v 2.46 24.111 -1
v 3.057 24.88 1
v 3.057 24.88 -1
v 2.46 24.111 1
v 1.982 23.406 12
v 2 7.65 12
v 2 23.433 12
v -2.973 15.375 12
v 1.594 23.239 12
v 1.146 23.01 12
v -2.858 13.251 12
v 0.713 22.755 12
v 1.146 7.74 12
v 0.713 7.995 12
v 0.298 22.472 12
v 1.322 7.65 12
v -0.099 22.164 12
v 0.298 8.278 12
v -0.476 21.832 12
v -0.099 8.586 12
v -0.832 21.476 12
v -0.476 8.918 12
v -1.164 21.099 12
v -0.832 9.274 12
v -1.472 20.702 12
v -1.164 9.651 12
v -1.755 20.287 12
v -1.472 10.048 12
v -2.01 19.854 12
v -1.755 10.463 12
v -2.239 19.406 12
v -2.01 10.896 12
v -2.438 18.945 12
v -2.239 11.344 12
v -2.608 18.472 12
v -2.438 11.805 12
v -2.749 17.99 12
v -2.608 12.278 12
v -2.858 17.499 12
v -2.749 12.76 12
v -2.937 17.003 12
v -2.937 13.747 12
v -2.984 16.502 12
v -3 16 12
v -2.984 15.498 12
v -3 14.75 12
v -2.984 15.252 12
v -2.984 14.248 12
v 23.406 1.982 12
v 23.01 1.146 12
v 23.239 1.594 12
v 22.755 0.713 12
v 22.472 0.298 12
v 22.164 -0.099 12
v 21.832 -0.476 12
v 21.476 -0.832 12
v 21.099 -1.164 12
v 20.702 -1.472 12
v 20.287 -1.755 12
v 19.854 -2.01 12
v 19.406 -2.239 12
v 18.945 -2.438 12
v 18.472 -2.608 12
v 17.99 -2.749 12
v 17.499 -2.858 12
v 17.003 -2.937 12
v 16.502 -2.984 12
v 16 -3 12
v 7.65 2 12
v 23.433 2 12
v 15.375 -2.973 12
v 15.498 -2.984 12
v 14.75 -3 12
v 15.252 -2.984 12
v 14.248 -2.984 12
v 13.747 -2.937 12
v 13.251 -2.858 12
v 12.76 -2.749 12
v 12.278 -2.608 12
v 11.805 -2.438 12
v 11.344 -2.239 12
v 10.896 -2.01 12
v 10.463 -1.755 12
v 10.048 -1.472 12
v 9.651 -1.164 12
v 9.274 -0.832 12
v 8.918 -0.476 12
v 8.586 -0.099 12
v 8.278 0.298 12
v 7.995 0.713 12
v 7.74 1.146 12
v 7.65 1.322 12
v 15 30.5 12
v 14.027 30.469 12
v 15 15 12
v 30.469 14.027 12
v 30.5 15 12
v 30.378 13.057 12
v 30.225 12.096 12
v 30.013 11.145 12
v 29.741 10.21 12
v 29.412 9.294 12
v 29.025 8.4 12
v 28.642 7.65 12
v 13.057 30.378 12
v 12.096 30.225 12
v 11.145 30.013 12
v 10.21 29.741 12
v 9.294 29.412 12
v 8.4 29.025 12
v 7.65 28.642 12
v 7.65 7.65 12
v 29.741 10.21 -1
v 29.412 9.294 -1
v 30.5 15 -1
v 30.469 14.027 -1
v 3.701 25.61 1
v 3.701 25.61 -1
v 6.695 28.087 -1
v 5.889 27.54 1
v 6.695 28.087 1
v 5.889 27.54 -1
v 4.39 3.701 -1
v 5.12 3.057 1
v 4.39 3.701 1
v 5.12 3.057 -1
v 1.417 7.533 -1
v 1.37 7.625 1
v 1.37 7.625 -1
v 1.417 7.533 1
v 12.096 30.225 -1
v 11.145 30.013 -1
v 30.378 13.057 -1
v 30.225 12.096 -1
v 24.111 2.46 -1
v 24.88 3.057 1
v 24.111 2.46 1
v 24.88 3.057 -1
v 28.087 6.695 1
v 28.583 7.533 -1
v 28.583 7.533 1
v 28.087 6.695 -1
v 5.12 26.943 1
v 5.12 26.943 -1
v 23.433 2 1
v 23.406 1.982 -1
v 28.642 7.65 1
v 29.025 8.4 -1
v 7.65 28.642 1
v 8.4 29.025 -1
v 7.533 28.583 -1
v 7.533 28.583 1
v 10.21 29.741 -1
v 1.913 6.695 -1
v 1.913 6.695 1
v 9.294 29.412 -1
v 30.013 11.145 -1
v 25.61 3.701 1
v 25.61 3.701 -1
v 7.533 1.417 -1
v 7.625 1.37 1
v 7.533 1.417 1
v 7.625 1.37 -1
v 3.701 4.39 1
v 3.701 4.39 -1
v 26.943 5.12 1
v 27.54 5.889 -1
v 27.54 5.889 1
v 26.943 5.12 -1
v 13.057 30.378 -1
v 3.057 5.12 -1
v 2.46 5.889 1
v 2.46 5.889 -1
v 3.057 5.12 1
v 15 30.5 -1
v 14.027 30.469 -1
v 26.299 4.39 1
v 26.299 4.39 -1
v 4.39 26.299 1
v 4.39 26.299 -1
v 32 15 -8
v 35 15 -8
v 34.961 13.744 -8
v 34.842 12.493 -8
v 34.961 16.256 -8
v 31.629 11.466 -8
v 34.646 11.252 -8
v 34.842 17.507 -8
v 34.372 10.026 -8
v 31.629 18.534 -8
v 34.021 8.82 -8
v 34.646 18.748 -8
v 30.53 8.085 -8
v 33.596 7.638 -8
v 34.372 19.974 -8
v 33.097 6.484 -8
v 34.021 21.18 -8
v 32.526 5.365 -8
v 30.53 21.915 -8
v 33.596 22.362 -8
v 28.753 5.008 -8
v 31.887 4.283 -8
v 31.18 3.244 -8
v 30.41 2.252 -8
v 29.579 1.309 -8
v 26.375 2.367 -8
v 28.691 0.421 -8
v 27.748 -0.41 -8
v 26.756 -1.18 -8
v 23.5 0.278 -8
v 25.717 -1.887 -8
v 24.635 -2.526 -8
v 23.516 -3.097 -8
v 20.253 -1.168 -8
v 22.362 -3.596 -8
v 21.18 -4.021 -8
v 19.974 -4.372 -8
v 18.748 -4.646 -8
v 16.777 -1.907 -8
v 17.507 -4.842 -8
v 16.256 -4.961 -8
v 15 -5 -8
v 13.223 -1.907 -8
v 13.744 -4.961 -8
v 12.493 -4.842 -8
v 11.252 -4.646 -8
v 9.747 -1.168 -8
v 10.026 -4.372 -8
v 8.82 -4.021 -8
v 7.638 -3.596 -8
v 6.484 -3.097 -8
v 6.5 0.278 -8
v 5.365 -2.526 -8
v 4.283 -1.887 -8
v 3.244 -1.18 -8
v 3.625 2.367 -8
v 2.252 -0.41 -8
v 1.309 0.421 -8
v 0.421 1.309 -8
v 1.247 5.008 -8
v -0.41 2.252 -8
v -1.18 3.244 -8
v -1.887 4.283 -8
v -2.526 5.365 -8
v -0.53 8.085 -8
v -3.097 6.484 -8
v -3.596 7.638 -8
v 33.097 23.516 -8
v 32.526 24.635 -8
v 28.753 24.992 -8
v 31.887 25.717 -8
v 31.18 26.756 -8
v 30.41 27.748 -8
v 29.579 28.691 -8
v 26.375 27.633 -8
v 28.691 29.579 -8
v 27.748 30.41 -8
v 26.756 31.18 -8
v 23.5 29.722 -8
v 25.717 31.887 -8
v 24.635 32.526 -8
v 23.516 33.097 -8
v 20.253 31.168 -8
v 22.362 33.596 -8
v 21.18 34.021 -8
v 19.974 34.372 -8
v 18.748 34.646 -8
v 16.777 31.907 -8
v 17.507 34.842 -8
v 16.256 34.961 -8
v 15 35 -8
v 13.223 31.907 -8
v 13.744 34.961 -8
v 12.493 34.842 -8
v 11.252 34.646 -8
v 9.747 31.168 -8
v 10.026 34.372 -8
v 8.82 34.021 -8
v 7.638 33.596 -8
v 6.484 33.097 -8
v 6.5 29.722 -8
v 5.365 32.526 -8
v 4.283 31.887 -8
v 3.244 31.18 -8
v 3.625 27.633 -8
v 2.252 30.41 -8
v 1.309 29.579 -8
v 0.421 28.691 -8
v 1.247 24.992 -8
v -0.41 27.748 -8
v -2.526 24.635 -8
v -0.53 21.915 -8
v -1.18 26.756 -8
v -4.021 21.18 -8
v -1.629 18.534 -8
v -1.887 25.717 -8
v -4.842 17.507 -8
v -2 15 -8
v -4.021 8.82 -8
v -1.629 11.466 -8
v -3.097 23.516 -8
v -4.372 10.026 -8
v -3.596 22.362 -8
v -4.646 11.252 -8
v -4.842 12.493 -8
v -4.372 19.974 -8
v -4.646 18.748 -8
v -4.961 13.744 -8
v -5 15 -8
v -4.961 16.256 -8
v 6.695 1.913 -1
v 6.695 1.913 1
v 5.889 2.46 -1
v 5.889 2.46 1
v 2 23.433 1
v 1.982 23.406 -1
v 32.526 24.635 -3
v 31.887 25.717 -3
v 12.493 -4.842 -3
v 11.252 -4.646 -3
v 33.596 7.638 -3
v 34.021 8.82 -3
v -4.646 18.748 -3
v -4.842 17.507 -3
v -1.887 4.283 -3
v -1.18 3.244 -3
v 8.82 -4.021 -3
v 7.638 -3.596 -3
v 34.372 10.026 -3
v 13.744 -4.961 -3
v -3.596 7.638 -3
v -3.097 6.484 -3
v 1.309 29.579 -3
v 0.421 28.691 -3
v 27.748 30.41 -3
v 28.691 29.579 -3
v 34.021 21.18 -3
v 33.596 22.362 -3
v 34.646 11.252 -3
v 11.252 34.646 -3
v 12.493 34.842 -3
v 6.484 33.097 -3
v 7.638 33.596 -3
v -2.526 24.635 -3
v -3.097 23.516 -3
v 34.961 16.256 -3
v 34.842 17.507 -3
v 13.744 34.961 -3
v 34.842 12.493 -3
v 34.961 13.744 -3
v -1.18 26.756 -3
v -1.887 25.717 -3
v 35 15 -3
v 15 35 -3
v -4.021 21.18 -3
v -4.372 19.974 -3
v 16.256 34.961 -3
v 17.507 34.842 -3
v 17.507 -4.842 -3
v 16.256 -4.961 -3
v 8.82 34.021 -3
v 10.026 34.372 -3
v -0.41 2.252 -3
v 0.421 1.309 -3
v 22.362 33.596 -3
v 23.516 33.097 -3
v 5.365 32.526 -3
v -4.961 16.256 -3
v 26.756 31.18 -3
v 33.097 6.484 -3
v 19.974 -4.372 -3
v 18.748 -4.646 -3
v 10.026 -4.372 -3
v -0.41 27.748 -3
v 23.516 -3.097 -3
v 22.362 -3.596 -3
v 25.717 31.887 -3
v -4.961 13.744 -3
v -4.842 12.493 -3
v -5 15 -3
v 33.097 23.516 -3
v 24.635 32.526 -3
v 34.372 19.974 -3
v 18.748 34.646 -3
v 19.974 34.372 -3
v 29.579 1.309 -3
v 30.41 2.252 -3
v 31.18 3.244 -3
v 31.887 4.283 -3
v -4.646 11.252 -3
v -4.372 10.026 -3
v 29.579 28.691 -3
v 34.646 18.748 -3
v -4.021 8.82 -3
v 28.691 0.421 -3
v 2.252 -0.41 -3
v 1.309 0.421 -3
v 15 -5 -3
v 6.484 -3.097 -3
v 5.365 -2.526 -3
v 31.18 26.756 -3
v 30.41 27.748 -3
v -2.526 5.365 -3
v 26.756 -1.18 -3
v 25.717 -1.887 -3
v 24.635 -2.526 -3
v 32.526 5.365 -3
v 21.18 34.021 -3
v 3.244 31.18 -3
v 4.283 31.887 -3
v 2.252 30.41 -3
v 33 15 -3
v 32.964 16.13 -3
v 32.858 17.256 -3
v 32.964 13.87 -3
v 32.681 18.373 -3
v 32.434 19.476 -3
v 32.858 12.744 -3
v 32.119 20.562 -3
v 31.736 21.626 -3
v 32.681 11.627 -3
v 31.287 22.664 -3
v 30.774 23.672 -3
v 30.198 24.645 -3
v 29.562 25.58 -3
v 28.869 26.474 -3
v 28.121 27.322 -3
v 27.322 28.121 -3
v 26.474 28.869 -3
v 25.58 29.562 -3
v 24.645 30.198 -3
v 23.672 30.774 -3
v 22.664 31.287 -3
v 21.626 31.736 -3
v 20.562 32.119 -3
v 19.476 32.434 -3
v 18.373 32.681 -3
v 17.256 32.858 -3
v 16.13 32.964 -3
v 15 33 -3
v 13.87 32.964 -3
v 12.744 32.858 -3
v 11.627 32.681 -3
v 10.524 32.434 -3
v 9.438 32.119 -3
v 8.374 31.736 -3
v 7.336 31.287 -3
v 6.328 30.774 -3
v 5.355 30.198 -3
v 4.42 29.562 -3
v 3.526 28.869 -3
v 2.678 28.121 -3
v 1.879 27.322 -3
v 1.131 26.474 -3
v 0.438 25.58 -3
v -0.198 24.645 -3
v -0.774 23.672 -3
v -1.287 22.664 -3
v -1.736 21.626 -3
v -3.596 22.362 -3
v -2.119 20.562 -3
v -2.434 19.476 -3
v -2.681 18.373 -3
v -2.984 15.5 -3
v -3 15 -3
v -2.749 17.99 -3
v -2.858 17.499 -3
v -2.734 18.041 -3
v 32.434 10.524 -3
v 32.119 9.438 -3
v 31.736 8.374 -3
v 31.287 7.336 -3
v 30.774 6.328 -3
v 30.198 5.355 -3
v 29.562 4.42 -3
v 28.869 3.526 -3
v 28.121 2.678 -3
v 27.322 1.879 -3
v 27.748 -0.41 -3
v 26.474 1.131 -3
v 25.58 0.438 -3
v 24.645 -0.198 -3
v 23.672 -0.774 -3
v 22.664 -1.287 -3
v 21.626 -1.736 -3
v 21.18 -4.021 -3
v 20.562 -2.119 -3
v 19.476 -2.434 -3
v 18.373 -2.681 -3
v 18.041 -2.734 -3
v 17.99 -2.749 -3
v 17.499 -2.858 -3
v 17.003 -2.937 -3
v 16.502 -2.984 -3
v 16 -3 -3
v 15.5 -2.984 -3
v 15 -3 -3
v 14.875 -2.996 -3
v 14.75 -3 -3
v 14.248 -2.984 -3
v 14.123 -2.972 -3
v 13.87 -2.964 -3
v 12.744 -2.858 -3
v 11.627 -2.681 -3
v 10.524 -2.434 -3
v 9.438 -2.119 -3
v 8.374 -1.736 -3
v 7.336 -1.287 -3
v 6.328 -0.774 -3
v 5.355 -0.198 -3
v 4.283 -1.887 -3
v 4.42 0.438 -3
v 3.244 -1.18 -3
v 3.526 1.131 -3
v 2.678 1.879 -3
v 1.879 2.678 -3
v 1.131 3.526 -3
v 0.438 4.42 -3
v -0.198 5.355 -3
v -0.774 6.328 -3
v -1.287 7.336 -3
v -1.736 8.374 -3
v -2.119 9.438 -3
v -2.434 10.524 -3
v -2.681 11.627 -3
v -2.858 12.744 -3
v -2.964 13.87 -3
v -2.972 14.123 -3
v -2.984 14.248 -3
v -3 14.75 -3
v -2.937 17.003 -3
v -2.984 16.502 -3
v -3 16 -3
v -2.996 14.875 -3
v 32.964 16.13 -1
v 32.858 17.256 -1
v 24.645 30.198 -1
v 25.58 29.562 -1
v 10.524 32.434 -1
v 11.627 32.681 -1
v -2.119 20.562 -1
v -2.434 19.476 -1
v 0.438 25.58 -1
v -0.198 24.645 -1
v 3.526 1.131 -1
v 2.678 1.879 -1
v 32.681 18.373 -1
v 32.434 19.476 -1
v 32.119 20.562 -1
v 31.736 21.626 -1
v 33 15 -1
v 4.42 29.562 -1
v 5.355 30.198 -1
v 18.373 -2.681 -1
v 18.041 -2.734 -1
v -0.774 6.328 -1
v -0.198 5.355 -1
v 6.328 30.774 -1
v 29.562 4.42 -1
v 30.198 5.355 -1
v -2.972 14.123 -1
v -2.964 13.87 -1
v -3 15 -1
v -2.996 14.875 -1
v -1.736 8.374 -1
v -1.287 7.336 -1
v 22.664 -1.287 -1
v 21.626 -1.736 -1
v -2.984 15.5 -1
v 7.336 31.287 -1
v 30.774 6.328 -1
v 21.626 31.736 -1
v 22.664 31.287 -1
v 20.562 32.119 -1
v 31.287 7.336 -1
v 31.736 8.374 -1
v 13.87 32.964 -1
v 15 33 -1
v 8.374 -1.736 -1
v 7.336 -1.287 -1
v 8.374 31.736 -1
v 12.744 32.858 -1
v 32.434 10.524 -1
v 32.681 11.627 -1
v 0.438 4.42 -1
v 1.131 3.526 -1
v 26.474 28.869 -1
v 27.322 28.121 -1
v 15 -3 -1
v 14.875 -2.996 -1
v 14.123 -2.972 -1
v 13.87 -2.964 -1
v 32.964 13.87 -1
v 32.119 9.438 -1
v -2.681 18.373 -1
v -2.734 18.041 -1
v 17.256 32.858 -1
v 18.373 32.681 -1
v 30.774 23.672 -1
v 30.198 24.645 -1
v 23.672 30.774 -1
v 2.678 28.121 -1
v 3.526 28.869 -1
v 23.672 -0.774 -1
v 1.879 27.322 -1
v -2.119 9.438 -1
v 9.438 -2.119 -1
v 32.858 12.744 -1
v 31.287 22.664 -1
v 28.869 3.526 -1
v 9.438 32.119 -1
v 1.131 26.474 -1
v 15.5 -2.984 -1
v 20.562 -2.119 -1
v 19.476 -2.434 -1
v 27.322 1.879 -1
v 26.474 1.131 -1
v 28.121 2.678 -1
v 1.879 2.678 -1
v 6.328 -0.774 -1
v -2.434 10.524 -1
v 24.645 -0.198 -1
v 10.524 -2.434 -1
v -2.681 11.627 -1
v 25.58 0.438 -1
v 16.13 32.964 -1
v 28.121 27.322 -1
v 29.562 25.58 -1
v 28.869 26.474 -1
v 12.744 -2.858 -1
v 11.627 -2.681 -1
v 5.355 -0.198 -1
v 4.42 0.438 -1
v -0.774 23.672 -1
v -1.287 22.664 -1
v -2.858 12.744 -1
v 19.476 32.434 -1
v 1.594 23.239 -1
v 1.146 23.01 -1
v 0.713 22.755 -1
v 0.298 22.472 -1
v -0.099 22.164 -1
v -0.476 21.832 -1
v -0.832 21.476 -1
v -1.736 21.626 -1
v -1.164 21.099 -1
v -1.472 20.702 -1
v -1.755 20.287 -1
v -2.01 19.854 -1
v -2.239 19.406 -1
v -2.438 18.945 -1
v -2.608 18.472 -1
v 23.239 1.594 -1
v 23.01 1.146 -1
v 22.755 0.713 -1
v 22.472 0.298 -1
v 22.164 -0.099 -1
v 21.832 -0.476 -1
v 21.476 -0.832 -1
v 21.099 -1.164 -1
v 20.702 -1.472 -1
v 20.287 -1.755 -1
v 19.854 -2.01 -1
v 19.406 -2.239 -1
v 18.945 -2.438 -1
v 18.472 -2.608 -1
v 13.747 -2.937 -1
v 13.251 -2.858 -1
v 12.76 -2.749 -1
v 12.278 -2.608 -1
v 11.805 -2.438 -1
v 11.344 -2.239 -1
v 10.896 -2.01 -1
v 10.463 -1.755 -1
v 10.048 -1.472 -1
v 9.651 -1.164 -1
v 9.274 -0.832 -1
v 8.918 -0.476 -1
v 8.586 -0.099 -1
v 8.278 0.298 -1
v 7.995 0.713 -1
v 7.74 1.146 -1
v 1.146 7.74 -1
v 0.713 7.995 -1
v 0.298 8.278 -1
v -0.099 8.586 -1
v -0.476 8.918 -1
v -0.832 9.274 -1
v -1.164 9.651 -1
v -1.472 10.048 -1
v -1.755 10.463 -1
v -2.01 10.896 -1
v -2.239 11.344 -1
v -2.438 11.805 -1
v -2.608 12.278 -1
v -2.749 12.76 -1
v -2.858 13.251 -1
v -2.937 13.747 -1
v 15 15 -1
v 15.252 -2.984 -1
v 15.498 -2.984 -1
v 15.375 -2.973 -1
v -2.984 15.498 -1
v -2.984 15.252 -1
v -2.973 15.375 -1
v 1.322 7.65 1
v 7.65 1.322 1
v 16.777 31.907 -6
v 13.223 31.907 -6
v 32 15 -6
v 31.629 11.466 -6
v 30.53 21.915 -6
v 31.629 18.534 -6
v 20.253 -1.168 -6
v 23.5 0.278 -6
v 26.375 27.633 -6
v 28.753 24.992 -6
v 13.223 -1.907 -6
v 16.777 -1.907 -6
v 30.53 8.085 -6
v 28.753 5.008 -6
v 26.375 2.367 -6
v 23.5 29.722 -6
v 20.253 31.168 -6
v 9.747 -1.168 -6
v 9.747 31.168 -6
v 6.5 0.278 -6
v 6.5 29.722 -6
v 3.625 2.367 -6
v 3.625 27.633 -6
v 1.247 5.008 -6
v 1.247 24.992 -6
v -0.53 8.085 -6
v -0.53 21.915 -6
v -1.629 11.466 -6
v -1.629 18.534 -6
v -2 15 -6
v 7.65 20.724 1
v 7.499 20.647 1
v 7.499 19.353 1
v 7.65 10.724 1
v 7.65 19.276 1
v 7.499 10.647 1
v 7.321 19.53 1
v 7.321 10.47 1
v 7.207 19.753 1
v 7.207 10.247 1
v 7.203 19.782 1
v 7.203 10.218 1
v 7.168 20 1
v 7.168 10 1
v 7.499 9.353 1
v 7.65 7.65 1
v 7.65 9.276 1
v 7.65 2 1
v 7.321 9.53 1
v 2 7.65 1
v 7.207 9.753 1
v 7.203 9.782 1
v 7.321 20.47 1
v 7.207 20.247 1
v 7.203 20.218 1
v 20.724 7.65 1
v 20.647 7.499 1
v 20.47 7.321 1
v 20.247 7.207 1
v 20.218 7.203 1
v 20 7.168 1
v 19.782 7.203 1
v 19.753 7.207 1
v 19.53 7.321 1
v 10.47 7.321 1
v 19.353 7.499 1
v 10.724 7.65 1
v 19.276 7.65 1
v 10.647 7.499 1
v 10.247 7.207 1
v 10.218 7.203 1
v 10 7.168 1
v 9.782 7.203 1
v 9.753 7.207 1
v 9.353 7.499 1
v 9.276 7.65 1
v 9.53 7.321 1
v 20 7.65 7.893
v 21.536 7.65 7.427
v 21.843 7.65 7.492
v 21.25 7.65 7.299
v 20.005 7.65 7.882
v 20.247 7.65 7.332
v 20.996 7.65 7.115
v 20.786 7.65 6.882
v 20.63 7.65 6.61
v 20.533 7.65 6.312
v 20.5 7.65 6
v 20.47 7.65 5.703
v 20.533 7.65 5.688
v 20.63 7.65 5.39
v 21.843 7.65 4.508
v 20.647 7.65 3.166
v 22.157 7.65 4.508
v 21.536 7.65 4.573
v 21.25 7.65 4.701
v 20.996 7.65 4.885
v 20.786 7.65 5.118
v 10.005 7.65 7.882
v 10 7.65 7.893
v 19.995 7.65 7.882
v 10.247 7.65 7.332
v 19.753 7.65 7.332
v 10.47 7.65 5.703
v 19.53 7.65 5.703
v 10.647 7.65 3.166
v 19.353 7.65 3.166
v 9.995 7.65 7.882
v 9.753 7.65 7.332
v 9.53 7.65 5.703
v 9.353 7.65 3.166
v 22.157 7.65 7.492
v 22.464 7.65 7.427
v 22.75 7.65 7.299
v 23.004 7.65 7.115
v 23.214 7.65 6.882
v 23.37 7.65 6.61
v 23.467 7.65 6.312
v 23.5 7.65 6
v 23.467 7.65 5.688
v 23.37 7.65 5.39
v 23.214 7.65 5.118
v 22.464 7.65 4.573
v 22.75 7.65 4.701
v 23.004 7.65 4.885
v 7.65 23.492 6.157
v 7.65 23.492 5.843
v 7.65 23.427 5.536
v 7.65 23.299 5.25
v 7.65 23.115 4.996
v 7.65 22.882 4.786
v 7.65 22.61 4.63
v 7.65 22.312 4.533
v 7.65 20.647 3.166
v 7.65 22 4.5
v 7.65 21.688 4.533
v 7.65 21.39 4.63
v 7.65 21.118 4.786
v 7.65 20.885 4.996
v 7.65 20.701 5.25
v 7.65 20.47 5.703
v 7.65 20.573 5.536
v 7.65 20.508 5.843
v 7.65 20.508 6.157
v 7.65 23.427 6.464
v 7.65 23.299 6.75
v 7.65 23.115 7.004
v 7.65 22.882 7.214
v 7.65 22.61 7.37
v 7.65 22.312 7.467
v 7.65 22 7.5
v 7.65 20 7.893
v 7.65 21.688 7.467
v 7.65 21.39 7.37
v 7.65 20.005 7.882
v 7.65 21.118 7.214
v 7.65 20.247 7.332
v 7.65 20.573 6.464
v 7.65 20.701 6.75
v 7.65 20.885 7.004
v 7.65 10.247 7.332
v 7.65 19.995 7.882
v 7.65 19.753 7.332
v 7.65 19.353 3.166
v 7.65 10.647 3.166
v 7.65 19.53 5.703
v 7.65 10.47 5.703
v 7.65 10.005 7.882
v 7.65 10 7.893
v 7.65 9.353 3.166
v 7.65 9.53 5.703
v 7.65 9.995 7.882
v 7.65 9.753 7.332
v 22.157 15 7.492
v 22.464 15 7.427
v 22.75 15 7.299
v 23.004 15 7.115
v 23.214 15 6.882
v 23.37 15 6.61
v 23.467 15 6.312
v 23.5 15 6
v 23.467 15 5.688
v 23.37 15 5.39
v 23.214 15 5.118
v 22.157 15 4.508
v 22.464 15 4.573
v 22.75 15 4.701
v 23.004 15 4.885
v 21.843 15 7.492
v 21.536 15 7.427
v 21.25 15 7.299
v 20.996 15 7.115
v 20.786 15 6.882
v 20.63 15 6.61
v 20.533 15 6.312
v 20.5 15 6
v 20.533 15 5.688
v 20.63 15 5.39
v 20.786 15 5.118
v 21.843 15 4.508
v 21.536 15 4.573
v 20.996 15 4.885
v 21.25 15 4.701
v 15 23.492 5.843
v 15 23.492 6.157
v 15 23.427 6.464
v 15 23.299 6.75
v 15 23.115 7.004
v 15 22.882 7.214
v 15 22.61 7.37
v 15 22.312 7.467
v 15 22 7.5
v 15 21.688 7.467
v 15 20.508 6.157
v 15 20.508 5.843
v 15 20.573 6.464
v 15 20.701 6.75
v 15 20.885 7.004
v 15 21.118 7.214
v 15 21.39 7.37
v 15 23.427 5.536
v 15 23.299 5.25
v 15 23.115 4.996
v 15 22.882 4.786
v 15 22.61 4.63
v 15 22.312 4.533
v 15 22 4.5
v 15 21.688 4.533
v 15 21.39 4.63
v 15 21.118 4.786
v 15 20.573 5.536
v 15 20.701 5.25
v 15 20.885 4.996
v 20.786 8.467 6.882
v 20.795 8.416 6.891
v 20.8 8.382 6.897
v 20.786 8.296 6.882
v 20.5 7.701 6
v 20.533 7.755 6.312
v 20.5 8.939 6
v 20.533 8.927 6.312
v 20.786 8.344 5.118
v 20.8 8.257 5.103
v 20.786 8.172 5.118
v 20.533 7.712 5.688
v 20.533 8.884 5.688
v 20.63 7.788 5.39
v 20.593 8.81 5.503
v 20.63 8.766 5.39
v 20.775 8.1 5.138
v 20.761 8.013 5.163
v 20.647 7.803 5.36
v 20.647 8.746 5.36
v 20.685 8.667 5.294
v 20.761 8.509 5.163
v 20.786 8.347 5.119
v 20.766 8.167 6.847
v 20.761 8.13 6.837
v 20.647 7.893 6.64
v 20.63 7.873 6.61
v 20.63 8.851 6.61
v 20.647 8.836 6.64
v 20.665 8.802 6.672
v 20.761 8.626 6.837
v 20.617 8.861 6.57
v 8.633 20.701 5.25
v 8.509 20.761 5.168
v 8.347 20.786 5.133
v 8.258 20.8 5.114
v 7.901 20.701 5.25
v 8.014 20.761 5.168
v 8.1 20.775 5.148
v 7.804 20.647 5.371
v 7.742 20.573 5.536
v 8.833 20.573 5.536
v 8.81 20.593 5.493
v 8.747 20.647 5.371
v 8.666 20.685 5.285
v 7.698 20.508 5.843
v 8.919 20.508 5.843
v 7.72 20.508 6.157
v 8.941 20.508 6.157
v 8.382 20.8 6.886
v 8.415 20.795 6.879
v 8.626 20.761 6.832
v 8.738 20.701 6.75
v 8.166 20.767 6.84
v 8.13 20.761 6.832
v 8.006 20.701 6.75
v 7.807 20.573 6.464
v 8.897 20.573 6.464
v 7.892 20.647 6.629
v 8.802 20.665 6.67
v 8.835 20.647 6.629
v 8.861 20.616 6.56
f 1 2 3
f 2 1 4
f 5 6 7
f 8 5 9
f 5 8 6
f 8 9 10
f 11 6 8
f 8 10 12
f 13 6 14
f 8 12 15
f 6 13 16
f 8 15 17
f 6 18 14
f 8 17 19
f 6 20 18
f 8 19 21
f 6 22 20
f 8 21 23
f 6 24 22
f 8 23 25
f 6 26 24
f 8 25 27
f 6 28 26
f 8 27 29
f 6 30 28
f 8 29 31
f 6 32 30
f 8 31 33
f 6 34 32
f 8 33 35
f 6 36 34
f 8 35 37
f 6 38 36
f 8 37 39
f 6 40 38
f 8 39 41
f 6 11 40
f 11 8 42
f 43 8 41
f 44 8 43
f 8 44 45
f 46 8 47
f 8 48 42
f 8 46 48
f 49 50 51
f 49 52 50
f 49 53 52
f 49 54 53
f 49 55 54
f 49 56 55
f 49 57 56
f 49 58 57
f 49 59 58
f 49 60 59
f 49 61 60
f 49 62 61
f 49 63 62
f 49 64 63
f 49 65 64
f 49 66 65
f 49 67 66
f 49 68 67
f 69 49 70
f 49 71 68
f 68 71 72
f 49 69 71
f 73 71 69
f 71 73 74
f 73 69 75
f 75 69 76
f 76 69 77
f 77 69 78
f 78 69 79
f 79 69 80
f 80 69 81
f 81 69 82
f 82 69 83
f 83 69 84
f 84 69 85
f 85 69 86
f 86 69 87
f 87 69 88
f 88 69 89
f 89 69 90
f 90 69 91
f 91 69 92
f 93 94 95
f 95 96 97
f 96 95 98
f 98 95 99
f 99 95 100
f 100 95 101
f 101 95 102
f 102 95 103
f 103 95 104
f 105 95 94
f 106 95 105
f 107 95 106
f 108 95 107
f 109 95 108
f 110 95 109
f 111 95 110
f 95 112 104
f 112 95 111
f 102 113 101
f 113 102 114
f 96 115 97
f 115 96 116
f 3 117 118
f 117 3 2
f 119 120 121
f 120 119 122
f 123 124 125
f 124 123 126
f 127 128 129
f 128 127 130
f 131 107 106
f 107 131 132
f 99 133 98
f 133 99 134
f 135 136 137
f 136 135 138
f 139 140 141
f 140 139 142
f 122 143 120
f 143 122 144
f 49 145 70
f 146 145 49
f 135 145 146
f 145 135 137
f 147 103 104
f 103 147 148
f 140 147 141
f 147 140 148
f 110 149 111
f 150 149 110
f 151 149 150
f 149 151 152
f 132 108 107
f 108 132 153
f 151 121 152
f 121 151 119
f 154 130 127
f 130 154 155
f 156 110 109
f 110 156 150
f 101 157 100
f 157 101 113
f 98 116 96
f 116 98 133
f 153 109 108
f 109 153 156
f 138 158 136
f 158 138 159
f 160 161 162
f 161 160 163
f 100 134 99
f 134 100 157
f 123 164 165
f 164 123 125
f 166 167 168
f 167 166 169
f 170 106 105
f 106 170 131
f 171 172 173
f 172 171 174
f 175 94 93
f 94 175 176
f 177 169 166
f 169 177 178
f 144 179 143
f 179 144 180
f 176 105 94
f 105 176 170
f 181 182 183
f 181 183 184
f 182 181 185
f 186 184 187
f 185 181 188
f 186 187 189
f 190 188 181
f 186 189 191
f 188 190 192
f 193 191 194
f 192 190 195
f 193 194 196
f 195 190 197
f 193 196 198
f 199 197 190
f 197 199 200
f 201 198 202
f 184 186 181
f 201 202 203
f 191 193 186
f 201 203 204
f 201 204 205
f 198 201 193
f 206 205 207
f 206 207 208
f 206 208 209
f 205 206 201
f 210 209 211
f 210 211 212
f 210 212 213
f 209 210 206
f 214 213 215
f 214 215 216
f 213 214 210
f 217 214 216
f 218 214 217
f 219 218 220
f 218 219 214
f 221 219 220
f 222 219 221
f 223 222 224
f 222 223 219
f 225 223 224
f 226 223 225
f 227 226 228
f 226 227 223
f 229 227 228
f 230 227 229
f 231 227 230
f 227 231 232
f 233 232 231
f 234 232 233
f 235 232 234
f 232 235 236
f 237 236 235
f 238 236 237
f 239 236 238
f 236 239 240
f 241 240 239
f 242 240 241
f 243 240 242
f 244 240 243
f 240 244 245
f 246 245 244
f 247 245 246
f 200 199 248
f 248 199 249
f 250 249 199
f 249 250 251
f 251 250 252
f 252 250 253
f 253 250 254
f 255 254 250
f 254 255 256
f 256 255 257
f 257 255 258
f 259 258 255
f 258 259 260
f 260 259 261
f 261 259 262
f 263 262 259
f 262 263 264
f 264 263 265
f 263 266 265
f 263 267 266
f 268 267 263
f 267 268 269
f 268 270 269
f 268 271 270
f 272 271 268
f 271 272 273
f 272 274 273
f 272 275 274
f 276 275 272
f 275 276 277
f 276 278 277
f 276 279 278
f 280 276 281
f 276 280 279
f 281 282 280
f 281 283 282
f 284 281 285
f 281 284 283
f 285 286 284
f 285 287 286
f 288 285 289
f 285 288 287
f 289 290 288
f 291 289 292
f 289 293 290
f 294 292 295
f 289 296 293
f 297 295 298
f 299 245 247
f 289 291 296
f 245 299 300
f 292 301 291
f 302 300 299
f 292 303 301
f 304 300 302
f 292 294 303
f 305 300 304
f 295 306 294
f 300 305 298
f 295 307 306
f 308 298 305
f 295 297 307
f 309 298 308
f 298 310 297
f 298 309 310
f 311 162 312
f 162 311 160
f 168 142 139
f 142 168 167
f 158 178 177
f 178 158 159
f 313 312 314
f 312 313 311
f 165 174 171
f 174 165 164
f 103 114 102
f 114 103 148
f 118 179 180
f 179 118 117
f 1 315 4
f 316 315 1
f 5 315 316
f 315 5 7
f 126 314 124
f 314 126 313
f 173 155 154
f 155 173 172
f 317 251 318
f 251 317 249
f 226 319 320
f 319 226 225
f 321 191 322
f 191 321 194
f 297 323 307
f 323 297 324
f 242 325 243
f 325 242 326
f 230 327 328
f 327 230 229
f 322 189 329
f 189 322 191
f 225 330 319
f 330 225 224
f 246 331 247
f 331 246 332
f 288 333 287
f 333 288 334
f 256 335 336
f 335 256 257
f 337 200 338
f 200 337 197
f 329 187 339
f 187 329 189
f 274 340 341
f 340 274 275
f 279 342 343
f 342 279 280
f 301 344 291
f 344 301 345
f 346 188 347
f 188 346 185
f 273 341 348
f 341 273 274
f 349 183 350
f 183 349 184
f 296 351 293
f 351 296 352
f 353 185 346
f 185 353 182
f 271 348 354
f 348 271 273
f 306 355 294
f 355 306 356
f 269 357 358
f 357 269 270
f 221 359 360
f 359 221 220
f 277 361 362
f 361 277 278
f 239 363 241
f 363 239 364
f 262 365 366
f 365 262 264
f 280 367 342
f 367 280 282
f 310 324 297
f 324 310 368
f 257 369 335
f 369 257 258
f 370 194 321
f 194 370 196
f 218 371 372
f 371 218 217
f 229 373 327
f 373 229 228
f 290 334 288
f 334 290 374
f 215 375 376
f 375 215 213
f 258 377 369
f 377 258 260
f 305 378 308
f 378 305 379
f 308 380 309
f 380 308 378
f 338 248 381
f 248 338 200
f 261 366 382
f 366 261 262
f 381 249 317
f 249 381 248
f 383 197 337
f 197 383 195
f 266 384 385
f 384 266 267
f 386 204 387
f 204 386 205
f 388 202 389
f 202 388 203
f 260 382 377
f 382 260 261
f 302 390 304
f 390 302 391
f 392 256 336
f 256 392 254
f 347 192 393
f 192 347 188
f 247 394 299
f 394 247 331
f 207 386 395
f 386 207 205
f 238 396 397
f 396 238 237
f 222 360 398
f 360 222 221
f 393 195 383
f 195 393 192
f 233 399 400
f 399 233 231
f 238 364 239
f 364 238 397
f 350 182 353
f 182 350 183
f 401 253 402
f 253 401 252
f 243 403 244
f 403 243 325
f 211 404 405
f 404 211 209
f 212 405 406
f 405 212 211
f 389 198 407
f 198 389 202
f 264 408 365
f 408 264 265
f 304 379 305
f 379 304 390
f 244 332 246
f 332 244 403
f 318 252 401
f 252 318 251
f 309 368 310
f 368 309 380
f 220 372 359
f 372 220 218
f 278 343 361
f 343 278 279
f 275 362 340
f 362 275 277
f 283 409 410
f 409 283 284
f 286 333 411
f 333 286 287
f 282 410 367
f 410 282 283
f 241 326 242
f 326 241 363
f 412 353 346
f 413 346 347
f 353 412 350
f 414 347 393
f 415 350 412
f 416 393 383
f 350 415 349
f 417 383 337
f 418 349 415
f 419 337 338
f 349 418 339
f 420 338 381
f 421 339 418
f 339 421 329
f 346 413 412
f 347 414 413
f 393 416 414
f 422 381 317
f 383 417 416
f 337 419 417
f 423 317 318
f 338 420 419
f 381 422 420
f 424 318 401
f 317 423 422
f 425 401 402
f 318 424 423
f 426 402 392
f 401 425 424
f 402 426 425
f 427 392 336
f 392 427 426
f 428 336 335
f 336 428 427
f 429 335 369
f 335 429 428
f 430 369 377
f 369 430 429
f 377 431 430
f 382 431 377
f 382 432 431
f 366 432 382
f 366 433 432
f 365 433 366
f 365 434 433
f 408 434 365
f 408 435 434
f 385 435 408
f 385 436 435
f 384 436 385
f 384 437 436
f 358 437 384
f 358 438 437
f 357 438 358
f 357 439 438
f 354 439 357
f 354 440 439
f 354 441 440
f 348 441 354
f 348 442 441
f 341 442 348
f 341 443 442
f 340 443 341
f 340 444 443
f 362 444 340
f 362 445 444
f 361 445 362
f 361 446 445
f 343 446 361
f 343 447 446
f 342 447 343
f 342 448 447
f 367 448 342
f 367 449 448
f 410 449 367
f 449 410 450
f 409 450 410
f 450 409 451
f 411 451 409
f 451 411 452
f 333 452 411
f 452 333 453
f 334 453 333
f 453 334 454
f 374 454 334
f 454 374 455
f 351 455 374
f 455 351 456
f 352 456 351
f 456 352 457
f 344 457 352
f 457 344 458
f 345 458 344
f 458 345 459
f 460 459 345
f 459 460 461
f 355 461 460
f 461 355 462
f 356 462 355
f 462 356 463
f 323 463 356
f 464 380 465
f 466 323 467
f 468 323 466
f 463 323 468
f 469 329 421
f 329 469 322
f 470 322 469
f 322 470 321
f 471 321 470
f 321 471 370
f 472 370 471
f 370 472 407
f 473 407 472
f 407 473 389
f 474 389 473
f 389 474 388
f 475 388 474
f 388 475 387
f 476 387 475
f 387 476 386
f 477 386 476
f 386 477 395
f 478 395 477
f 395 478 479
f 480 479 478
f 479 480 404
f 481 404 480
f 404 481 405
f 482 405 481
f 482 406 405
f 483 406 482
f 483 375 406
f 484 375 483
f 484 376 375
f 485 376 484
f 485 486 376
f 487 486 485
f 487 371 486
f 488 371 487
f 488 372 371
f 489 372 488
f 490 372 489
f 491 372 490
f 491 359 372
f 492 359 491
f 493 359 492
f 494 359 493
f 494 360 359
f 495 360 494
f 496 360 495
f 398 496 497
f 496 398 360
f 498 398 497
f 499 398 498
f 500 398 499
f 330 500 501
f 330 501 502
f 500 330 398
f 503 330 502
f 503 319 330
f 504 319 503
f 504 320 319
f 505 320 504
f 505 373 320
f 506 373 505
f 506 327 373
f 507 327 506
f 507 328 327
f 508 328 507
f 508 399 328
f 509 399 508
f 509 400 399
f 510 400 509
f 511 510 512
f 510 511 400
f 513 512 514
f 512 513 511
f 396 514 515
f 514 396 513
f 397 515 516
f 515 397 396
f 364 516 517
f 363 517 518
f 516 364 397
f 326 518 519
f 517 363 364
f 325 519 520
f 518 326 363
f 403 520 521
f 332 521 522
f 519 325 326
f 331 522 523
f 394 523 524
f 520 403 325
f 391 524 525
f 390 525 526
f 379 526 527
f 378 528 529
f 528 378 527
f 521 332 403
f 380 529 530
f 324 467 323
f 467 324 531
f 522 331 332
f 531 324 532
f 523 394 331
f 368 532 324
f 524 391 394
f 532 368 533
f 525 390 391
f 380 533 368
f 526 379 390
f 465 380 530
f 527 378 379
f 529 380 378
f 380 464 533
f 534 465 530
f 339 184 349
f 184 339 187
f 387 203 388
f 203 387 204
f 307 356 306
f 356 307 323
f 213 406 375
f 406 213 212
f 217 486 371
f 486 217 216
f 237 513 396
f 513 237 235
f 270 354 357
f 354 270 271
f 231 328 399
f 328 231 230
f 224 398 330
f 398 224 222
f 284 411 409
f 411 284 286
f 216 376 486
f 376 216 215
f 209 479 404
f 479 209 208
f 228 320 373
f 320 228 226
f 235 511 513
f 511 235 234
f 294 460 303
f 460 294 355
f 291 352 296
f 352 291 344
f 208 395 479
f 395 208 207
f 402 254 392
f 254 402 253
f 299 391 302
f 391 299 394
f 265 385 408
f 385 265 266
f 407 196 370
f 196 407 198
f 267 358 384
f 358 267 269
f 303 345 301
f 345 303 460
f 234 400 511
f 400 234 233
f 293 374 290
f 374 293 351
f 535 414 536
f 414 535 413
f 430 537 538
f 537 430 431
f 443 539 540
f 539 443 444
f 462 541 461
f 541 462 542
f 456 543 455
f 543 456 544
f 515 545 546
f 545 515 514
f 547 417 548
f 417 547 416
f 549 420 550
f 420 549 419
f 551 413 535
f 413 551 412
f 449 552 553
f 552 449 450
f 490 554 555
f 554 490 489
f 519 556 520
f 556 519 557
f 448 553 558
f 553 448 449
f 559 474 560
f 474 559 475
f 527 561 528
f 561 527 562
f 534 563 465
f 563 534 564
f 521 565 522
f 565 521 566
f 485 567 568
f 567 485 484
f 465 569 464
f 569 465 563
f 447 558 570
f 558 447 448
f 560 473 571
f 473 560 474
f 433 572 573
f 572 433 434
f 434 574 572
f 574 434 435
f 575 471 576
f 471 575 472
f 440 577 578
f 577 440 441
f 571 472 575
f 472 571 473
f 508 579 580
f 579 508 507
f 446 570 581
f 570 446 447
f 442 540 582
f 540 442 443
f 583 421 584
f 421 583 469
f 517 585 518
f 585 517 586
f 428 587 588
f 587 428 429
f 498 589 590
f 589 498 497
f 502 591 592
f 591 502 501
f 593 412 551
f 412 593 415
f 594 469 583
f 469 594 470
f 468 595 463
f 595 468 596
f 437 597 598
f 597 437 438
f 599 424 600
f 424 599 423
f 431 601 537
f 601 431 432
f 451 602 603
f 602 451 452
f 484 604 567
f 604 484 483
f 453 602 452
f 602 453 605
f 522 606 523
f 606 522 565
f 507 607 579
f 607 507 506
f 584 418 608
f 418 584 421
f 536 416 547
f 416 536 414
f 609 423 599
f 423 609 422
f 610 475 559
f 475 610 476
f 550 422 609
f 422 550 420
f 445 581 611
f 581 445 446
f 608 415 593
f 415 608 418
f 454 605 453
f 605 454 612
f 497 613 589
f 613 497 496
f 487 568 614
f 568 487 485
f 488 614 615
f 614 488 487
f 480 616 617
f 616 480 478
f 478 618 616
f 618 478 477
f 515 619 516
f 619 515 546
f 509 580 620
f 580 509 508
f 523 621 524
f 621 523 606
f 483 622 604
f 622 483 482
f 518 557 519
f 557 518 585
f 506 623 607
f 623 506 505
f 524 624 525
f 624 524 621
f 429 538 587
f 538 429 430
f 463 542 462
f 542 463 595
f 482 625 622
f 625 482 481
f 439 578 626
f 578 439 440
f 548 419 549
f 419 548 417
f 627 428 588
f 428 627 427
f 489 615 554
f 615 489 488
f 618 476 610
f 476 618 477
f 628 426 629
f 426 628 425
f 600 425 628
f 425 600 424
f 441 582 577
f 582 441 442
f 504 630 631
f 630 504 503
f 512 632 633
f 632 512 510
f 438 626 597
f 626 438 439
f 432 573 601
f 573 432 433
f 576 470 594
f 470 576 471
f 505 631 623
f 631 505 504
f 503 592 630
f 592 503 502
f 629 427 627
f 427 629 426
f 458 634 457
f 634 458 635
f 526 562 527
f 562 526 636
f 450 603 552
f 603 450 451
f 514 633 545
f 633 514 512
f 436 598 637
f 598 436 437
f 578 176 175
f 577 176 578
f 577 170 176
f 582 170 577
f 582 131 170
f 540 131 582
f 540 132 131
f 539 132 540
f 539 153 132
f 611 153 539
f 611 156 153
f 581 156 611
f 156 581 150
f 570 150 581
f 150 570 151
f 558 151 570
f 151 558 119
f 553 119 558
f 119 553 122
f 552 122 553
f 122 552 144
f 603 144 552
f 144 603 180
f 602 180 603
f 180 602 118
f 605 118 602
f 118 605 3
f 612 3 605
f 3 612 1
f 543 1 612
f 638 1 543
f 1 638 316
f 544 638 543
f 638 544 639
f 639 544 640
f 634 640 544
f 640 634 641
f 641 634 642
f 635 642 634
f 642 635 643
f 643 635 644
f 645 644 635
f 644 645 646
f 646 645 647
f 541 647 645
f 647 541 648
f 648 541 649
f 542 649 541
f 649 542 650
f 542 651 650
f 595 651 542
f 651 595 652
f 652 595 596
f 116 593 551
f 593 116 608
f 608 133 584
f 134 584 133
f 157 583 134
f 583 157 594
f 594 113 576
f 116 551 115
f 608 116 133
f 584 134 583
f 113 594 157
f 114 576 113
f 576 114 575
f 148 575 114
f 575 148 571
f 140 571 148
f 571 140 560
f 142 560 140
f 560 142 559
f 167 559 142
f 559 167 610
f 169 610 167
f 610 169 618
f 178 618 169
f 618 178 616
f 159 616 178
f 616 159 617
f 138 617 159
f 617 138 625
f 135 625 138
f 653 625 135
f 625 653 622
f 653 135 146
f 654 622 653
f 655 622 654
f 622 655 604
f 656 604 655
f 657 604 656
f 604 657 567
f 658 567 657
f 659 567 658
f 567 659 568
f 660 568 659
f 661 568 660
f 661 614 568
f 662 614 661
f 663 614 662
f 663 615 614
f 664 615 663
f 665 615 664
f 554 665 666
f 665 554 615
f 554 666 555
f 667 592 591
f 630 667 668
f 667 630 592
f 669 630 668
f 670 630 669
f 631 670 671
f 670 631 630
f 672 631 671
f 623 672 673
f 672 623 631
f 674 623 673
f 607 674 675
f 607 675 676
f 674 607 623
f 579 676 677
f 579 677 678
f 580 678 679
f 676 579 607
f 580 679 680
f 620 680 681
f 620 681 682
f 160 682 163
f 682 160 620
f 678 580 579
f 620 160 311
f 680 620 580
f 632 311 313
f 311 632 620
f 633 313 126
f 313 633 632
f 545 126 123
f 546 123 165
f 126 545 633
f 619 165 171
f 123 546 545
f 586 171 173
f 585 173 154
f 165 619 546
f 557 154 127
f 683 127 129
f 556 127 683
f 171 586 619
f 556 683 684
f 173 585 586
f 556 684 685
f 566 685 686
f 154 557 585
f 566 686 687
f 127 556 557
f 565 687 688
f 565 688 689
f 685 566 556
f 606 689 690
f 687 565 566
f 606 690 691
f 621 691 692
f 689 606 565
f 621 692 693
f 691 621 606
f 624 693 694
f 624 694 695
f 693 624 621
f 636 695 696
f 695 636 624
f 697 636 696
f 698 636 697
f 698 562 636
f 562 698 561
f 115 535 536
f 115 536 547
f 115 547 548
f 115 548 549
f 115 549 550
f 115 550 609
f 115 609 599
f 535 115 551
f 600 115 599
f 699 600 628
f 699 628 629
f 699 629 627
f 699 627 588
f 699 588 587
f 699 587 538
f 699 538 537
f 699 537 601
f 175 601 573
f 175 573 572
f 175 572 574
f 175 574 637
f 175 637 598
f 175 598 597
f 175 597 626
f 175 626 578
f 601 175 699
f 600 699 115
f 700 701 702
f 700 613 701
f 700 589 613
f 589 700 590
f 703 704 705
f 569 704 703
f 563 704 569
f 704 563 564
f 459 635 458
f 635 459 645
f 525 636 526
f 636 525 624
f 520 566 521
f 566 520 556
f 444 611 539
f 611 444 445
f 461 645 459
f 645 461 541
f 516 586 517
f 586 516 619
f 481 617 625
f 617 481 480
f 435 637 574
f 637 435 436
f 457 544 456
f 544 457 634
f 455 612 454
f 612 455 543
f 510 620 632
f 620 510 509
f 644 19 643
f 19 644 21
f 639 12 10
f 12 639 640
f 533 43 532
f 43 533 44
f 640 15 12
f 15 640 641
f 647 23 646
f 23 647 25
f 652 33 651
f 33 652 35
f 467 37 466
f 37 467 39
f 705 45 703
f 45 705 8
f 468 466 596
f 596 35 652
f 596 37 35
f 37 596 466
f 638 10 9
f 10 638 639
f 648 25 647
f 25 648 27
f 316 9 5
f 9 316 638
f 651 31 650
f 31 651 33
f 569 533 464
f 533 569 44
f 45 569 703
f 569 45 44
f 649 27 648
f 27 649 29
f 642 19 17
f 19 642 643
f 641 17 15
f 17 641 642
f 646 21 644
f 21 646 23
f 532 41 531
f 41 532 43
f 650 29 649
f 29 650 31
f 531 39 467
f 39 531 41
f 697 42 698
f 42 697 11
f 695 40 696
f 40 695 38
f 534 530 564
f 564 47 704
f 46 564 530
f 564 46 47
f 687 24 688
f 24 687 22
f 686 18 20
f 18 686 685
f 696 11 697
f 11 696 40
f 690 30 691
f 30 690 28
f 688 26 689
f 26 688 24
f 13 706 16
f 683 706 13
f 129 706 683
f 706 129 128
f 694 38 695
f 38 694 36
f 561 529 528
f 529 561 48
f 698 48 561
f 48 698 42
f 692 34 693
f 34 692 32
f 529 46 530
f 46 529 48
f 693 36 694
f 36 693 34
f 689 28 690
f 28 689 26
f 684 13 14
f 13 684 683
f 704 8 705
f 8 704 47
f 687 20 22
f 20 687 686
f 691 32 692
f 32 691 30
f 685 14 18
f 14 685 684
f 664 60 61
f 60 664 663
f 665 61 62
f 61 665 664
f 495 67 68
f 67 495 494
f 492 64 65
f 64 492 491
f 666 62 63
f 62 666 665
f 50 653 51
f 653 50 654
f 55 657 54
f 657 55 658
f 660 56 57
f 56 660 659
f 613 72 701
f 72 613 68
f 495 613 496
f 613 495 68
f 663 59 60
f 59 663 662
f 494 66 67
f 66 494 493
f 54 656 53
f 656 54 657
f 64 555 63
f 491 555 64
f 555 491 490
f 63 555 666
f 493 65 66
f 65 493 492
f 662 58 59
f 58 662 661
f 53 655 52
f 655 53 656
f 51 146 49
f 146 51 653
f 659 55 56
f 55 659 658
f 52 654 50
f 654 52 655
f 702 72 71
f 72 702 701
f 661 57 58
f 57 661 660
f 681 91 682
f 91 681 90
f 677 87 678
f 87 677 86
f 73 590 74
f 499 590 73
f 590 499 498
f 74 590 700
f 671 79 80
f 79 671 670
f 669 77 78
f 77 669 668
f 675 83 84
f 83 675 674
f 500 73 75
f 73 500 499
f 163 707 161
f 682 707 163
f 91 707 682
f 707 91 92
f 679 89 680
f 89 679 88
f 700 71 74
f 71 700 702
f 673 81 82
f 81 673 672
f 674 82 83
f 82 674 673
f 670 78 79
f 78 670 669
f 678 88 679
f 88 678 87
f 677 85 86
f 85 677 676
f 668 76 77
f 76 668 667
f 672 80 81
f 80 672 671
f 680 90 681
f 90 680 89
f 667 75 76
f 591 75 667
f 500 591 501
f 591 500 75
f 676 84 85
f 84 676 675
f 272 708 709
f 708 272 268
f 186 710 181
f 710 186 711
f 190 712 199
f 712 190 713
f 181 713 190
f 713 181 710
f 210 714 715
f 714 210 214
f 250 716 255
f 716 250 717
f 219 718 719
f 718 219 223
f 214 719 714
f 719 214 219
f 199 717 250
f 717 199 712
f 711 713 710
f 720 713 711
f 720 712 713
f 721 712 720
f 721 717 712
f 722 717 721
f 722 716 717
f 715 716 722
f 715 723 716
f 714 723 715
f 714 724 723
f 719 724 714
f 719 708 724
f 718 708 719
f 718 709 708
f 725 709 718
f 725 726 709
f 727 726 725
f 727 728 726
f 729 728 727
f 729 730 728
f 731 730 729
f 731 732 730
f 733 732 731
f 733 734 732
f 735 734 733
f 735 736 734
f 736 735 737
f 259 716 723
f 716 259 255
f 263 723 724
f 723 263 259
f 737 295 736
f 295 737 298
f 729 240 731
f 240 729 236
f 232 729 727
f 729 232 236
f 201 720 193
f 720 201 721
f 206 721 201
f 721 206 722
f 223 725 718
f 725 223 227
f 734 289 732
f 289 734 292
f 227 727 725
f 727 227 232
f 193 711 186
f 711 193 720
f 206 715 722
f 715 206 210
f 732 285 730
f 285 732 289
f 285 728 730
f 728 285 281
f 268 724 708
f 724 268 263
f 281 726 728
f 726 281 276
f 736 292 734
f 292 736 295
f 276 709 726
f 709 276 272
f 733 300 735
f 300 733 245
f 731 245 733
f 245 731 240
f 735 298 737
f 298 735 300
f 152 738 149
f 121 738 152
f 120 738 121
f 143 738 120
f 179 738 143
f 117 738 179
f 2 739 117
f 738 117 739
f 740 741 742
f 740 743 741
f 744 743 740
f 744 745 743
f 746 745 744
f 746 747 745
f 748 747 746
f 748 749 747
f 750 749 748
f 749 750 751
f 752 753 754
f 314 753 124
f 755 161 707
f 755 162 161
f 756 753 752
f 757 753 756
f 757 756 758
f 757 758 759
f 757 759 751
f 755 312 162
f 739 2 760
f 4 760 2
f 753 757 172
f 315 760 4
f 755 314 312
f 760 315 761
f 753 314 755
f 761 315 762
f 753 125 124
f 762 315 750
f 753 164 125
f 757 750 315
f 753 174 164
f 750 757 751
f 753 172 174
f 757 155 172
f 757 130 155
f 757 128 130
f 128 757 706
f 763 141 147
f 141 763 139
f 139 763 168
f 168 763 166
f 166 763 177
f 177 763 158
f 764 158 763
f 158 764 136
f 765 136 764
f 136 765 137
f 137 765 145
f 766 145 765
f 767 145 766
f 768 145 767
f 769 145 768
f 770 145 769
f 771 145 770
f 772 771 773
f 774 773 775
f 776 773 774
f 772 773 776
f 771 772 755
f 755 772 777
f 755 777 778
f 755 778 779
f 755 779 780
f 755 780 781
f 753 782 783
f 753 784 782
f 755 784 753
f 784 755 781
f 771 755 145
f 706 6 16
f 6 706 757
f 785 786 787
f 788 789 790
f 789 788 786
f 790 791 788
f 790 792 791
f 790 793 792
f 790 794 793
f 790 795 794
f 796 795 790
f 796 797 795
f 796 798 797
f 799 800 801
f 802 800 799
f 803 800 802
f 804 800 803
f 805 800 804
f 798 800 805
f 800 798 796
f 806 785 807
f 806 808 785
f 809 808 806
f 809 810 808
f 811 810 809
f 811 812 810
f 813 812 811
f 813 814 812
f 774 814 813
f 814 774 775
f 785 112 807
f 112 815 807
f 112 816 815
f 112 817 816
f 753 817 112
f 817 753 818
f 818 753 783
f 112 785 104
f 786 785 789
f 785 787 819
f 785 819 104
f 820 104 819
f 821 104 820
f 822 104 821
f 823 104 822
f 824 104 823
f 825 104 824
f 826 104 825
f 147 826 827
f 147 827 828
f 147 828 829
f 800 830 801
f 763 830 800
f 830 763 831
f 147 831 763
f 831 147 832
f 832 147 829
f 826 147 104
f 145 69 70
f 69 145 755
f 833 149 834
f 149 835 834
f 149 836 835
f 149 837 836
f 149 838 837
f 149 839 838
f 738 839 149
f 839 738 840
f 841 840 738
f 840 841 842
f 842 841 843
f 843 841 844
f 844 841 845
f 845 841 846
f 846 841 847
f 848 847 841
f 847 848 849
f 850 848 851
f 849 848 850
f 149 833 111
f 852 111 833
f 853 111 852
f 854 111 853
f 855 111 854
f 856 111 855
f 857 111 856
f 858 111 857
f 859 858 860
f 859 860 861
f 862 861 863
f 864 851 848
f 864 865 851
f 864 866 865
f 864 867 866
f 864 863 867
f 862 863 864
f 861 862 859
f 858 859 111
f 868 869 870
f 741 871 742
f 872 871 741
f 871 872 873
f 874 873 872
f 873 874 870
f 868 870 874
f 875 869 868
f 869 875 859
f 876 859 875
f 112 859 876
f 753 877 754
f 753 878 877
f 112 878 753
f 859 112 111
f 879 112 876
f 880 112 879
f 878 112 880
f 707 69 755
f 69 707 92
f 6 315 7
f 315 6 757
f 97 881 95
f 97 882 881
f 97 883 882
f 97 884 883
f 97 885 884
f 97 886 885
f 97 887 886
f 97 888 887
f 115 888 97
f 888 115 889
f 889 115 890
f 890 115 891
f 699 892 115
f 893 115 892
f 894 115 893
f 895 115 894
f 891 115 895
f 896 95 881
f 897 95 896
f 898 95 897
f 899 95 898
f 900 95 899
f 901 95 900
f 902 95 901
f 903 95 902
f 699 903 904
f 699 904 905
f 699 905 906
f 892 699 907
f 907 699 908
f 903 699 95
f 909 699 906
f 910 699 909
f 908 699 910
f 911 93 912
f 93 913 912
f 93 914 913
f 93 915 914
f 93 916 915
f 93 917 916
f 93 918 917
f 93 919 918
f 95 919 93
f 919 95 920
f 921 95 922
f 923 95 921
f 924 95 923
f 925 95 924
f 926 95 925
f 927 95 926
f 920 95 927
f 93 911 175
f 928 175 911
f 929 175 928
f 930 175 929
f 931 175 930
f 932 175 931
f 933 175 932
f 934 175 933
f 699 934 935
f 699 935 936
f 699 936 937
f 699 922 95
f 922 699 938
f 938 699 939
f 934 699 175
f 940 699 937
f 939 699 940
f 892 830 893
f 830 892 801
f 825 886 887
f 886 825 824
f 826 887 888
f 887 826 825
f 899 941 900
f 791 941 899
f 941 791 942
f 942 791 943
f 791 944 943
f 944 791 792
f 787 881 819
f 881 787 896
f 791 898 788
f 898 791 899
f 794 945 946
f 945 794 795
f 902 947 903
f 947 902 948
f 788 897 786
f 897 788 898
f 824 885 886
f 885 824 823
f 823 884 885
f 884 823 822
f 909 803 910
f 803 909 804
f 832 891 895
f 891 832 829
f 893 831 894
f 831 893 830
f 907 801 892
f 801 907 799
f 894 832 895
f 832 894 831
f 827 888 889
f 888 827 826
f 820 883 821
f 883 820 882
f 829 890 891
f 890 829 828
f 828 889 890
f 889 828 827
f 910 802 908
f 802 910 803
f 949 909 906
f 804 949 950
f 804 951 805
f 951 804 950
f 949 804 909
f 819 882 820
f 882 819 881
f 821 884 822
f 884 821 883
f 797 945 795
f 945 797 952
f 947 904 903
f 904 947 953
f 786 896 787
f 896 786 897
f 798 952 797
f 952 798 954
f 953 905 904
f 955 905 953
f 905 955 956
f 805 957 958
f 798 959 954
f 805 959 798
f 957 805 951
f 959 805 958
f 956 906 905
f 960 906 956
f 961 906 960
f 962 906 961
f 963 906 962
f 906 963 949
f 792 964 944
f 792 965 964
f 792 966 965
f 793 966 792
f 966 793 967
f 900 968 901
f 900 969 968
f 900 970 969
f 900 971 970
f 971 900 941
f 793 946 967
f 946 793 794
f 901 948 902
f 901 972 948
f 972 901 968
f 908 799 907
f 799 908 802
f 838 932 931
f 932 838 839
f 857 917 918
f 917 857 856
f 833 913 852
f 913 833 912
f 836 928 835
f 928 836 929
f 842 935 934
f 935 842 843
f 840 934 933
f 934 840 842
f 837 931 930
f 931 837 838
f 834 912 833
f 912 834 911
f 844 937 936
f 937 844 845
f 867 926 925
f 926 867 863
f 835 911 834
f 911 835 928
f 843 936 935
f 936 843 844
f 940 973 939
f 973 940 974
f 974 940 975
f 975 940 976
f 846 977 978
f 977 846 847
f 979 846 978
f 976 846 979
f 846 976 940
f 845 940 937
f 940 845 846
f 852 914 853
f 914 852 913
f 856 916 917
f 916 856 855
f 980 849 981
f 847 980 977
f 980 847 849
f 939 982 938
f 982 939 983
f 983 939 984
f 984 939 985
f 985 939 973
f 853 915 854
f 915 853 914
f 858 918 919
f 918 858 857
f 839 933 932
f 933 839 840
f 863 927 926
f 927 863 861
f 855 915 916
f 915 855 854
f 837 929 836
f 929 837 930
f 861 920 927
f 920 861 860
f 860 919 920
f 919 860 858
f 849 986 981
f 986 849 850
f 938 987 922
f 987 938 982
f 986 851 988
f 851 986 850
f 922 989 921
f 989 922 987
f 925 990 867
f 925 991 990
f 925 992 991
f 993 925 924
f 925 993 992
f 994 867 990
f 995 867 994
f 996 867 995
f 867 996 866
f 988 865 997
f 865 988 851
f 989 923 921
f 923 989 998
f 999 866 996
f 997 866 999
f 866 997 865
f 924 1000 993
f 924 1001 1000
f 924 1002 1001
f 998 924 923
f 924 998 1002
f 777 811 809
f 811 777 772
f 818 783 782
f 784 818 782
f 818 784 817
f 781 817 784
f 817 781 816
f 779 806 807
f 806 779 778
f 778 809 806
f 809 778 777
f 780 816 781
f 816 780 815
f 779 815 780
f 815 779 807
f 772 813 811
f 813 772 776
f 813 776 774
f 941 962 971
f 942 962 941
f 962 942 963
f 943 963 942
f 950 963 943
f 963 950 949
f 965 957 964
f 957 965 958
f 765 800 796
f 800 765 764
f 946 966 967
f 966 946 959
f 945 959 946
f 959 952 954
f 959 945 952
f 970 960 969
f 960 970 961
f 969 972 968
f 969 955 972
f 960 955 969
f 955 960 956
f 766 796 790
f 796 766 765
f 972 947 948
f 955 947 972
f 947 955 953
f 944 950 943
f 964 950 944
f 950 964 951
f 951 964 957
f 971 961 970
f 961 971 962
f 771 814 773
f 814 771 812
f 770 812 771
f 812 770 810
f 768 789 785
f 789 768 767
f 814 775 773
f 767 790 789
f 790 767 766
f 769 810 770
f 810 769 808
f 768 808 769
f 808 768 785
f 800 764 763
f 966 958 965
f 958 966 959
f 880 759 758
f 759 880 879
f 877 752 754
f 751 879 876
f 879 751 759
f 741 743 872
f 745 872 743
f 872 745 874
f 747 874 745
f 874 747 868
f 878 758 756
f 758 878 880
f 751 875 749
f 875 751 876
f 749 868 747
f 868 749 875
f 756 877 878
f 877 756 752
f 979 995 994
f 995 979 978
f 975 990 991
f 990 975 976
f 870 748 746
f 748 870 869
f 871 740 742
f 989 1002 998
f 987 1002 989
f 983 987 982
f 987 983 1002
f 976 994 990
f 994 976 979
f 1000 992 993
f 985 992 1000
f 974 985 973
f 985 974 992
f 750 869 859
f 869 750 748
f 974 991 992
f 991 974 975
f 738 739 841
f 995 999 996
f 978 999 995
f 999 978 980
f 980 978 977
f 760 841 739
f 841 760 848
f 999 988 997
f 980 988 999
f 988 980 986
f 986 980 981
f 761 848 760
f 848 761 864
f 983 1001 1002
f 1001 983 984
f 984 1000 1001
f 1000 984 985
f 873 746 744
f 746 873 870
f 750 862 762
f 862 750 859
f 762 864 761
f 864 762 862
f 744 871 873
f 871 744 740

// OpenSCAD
//  Replicator foot for gripper pad
//  The pad used is a one inch diameter, brand name 'SoftTouch by Waxman  #7385'
//  They come 16 to a package and I think I either got these at Walmart or Lowe's Hardware.

//  1/13/13 - GAC:  enlarged foot area slightly to take 1.25" dia Sorbothane isolators -
//  http://www.amazon.com/gp/product/B003IMJ3S2/ref=oh_details_o02_s02_i00



difference () {
	union(){
		translate ([ 15, 15, -8]) cylinder (h=20, r=15.5, $fn=100);
		translate ([ 15, 15, -8]) cylinder (h=5, r=20, $fn=100);
		translate ([ 15, 15, -6]) cylinder (h=5, r=18, $fn=100);
		translate ([ 5, 16, -8]) cylinder (h=20, r=8, $fn=100);
		translate ([ 5, 14.75, -8]) cylinder (h=20, r=8, $fn=100);
		translate ([ 16,5, -8]) cylinder (h=20, r=8, $fn=100);
		translate ([14.75,5, -8]) cylinder (h=20, r=8, $fn=100);
	} // union

	translate ([ 15, 15, -16]) cylinder (h=10, r=17);
	translate ([-10,2,1]) cube (size = [60,5.65,15], center = false);
	rotate ([0,0,270]) translate ([-50,2,1]) cube (size = [60,5.65,15], center = false);
	rotate ([0,0,270]) translate ([-65,15,-1]) cube (size = [50,50,16], center = false);
	
	// added a couple of holes for a 3mm setscrew if needed to hold foot in place
	translate ([22, 16, 6]) rotate (a = [90, 0, 0]) cylinder (h = 10, r = 1.5, $fn = 30);
	translate ([6, 22, 6]) rotate (a = [0, 90, 0]) cylinder (h = 10, r = 1.5, $fn = 30);

} // difference


translate ([10,7.9,0])
rotate ([-4,0,0])
cylinder (h=8, r=.8, $fn=20);

translate ([20,7.9,0])
rotate ([-4,0,0])
cylinder (h=8, r=.8, $fn=20);

translate ([7.9,10,0])
rotate ([0,4,0])
cylinder (h=8, r=.8, $fn=20);

translate ([7.9,20,0])
rotate ([0,4,0])
cylinder (h=8, r=.8, $fn=20);
